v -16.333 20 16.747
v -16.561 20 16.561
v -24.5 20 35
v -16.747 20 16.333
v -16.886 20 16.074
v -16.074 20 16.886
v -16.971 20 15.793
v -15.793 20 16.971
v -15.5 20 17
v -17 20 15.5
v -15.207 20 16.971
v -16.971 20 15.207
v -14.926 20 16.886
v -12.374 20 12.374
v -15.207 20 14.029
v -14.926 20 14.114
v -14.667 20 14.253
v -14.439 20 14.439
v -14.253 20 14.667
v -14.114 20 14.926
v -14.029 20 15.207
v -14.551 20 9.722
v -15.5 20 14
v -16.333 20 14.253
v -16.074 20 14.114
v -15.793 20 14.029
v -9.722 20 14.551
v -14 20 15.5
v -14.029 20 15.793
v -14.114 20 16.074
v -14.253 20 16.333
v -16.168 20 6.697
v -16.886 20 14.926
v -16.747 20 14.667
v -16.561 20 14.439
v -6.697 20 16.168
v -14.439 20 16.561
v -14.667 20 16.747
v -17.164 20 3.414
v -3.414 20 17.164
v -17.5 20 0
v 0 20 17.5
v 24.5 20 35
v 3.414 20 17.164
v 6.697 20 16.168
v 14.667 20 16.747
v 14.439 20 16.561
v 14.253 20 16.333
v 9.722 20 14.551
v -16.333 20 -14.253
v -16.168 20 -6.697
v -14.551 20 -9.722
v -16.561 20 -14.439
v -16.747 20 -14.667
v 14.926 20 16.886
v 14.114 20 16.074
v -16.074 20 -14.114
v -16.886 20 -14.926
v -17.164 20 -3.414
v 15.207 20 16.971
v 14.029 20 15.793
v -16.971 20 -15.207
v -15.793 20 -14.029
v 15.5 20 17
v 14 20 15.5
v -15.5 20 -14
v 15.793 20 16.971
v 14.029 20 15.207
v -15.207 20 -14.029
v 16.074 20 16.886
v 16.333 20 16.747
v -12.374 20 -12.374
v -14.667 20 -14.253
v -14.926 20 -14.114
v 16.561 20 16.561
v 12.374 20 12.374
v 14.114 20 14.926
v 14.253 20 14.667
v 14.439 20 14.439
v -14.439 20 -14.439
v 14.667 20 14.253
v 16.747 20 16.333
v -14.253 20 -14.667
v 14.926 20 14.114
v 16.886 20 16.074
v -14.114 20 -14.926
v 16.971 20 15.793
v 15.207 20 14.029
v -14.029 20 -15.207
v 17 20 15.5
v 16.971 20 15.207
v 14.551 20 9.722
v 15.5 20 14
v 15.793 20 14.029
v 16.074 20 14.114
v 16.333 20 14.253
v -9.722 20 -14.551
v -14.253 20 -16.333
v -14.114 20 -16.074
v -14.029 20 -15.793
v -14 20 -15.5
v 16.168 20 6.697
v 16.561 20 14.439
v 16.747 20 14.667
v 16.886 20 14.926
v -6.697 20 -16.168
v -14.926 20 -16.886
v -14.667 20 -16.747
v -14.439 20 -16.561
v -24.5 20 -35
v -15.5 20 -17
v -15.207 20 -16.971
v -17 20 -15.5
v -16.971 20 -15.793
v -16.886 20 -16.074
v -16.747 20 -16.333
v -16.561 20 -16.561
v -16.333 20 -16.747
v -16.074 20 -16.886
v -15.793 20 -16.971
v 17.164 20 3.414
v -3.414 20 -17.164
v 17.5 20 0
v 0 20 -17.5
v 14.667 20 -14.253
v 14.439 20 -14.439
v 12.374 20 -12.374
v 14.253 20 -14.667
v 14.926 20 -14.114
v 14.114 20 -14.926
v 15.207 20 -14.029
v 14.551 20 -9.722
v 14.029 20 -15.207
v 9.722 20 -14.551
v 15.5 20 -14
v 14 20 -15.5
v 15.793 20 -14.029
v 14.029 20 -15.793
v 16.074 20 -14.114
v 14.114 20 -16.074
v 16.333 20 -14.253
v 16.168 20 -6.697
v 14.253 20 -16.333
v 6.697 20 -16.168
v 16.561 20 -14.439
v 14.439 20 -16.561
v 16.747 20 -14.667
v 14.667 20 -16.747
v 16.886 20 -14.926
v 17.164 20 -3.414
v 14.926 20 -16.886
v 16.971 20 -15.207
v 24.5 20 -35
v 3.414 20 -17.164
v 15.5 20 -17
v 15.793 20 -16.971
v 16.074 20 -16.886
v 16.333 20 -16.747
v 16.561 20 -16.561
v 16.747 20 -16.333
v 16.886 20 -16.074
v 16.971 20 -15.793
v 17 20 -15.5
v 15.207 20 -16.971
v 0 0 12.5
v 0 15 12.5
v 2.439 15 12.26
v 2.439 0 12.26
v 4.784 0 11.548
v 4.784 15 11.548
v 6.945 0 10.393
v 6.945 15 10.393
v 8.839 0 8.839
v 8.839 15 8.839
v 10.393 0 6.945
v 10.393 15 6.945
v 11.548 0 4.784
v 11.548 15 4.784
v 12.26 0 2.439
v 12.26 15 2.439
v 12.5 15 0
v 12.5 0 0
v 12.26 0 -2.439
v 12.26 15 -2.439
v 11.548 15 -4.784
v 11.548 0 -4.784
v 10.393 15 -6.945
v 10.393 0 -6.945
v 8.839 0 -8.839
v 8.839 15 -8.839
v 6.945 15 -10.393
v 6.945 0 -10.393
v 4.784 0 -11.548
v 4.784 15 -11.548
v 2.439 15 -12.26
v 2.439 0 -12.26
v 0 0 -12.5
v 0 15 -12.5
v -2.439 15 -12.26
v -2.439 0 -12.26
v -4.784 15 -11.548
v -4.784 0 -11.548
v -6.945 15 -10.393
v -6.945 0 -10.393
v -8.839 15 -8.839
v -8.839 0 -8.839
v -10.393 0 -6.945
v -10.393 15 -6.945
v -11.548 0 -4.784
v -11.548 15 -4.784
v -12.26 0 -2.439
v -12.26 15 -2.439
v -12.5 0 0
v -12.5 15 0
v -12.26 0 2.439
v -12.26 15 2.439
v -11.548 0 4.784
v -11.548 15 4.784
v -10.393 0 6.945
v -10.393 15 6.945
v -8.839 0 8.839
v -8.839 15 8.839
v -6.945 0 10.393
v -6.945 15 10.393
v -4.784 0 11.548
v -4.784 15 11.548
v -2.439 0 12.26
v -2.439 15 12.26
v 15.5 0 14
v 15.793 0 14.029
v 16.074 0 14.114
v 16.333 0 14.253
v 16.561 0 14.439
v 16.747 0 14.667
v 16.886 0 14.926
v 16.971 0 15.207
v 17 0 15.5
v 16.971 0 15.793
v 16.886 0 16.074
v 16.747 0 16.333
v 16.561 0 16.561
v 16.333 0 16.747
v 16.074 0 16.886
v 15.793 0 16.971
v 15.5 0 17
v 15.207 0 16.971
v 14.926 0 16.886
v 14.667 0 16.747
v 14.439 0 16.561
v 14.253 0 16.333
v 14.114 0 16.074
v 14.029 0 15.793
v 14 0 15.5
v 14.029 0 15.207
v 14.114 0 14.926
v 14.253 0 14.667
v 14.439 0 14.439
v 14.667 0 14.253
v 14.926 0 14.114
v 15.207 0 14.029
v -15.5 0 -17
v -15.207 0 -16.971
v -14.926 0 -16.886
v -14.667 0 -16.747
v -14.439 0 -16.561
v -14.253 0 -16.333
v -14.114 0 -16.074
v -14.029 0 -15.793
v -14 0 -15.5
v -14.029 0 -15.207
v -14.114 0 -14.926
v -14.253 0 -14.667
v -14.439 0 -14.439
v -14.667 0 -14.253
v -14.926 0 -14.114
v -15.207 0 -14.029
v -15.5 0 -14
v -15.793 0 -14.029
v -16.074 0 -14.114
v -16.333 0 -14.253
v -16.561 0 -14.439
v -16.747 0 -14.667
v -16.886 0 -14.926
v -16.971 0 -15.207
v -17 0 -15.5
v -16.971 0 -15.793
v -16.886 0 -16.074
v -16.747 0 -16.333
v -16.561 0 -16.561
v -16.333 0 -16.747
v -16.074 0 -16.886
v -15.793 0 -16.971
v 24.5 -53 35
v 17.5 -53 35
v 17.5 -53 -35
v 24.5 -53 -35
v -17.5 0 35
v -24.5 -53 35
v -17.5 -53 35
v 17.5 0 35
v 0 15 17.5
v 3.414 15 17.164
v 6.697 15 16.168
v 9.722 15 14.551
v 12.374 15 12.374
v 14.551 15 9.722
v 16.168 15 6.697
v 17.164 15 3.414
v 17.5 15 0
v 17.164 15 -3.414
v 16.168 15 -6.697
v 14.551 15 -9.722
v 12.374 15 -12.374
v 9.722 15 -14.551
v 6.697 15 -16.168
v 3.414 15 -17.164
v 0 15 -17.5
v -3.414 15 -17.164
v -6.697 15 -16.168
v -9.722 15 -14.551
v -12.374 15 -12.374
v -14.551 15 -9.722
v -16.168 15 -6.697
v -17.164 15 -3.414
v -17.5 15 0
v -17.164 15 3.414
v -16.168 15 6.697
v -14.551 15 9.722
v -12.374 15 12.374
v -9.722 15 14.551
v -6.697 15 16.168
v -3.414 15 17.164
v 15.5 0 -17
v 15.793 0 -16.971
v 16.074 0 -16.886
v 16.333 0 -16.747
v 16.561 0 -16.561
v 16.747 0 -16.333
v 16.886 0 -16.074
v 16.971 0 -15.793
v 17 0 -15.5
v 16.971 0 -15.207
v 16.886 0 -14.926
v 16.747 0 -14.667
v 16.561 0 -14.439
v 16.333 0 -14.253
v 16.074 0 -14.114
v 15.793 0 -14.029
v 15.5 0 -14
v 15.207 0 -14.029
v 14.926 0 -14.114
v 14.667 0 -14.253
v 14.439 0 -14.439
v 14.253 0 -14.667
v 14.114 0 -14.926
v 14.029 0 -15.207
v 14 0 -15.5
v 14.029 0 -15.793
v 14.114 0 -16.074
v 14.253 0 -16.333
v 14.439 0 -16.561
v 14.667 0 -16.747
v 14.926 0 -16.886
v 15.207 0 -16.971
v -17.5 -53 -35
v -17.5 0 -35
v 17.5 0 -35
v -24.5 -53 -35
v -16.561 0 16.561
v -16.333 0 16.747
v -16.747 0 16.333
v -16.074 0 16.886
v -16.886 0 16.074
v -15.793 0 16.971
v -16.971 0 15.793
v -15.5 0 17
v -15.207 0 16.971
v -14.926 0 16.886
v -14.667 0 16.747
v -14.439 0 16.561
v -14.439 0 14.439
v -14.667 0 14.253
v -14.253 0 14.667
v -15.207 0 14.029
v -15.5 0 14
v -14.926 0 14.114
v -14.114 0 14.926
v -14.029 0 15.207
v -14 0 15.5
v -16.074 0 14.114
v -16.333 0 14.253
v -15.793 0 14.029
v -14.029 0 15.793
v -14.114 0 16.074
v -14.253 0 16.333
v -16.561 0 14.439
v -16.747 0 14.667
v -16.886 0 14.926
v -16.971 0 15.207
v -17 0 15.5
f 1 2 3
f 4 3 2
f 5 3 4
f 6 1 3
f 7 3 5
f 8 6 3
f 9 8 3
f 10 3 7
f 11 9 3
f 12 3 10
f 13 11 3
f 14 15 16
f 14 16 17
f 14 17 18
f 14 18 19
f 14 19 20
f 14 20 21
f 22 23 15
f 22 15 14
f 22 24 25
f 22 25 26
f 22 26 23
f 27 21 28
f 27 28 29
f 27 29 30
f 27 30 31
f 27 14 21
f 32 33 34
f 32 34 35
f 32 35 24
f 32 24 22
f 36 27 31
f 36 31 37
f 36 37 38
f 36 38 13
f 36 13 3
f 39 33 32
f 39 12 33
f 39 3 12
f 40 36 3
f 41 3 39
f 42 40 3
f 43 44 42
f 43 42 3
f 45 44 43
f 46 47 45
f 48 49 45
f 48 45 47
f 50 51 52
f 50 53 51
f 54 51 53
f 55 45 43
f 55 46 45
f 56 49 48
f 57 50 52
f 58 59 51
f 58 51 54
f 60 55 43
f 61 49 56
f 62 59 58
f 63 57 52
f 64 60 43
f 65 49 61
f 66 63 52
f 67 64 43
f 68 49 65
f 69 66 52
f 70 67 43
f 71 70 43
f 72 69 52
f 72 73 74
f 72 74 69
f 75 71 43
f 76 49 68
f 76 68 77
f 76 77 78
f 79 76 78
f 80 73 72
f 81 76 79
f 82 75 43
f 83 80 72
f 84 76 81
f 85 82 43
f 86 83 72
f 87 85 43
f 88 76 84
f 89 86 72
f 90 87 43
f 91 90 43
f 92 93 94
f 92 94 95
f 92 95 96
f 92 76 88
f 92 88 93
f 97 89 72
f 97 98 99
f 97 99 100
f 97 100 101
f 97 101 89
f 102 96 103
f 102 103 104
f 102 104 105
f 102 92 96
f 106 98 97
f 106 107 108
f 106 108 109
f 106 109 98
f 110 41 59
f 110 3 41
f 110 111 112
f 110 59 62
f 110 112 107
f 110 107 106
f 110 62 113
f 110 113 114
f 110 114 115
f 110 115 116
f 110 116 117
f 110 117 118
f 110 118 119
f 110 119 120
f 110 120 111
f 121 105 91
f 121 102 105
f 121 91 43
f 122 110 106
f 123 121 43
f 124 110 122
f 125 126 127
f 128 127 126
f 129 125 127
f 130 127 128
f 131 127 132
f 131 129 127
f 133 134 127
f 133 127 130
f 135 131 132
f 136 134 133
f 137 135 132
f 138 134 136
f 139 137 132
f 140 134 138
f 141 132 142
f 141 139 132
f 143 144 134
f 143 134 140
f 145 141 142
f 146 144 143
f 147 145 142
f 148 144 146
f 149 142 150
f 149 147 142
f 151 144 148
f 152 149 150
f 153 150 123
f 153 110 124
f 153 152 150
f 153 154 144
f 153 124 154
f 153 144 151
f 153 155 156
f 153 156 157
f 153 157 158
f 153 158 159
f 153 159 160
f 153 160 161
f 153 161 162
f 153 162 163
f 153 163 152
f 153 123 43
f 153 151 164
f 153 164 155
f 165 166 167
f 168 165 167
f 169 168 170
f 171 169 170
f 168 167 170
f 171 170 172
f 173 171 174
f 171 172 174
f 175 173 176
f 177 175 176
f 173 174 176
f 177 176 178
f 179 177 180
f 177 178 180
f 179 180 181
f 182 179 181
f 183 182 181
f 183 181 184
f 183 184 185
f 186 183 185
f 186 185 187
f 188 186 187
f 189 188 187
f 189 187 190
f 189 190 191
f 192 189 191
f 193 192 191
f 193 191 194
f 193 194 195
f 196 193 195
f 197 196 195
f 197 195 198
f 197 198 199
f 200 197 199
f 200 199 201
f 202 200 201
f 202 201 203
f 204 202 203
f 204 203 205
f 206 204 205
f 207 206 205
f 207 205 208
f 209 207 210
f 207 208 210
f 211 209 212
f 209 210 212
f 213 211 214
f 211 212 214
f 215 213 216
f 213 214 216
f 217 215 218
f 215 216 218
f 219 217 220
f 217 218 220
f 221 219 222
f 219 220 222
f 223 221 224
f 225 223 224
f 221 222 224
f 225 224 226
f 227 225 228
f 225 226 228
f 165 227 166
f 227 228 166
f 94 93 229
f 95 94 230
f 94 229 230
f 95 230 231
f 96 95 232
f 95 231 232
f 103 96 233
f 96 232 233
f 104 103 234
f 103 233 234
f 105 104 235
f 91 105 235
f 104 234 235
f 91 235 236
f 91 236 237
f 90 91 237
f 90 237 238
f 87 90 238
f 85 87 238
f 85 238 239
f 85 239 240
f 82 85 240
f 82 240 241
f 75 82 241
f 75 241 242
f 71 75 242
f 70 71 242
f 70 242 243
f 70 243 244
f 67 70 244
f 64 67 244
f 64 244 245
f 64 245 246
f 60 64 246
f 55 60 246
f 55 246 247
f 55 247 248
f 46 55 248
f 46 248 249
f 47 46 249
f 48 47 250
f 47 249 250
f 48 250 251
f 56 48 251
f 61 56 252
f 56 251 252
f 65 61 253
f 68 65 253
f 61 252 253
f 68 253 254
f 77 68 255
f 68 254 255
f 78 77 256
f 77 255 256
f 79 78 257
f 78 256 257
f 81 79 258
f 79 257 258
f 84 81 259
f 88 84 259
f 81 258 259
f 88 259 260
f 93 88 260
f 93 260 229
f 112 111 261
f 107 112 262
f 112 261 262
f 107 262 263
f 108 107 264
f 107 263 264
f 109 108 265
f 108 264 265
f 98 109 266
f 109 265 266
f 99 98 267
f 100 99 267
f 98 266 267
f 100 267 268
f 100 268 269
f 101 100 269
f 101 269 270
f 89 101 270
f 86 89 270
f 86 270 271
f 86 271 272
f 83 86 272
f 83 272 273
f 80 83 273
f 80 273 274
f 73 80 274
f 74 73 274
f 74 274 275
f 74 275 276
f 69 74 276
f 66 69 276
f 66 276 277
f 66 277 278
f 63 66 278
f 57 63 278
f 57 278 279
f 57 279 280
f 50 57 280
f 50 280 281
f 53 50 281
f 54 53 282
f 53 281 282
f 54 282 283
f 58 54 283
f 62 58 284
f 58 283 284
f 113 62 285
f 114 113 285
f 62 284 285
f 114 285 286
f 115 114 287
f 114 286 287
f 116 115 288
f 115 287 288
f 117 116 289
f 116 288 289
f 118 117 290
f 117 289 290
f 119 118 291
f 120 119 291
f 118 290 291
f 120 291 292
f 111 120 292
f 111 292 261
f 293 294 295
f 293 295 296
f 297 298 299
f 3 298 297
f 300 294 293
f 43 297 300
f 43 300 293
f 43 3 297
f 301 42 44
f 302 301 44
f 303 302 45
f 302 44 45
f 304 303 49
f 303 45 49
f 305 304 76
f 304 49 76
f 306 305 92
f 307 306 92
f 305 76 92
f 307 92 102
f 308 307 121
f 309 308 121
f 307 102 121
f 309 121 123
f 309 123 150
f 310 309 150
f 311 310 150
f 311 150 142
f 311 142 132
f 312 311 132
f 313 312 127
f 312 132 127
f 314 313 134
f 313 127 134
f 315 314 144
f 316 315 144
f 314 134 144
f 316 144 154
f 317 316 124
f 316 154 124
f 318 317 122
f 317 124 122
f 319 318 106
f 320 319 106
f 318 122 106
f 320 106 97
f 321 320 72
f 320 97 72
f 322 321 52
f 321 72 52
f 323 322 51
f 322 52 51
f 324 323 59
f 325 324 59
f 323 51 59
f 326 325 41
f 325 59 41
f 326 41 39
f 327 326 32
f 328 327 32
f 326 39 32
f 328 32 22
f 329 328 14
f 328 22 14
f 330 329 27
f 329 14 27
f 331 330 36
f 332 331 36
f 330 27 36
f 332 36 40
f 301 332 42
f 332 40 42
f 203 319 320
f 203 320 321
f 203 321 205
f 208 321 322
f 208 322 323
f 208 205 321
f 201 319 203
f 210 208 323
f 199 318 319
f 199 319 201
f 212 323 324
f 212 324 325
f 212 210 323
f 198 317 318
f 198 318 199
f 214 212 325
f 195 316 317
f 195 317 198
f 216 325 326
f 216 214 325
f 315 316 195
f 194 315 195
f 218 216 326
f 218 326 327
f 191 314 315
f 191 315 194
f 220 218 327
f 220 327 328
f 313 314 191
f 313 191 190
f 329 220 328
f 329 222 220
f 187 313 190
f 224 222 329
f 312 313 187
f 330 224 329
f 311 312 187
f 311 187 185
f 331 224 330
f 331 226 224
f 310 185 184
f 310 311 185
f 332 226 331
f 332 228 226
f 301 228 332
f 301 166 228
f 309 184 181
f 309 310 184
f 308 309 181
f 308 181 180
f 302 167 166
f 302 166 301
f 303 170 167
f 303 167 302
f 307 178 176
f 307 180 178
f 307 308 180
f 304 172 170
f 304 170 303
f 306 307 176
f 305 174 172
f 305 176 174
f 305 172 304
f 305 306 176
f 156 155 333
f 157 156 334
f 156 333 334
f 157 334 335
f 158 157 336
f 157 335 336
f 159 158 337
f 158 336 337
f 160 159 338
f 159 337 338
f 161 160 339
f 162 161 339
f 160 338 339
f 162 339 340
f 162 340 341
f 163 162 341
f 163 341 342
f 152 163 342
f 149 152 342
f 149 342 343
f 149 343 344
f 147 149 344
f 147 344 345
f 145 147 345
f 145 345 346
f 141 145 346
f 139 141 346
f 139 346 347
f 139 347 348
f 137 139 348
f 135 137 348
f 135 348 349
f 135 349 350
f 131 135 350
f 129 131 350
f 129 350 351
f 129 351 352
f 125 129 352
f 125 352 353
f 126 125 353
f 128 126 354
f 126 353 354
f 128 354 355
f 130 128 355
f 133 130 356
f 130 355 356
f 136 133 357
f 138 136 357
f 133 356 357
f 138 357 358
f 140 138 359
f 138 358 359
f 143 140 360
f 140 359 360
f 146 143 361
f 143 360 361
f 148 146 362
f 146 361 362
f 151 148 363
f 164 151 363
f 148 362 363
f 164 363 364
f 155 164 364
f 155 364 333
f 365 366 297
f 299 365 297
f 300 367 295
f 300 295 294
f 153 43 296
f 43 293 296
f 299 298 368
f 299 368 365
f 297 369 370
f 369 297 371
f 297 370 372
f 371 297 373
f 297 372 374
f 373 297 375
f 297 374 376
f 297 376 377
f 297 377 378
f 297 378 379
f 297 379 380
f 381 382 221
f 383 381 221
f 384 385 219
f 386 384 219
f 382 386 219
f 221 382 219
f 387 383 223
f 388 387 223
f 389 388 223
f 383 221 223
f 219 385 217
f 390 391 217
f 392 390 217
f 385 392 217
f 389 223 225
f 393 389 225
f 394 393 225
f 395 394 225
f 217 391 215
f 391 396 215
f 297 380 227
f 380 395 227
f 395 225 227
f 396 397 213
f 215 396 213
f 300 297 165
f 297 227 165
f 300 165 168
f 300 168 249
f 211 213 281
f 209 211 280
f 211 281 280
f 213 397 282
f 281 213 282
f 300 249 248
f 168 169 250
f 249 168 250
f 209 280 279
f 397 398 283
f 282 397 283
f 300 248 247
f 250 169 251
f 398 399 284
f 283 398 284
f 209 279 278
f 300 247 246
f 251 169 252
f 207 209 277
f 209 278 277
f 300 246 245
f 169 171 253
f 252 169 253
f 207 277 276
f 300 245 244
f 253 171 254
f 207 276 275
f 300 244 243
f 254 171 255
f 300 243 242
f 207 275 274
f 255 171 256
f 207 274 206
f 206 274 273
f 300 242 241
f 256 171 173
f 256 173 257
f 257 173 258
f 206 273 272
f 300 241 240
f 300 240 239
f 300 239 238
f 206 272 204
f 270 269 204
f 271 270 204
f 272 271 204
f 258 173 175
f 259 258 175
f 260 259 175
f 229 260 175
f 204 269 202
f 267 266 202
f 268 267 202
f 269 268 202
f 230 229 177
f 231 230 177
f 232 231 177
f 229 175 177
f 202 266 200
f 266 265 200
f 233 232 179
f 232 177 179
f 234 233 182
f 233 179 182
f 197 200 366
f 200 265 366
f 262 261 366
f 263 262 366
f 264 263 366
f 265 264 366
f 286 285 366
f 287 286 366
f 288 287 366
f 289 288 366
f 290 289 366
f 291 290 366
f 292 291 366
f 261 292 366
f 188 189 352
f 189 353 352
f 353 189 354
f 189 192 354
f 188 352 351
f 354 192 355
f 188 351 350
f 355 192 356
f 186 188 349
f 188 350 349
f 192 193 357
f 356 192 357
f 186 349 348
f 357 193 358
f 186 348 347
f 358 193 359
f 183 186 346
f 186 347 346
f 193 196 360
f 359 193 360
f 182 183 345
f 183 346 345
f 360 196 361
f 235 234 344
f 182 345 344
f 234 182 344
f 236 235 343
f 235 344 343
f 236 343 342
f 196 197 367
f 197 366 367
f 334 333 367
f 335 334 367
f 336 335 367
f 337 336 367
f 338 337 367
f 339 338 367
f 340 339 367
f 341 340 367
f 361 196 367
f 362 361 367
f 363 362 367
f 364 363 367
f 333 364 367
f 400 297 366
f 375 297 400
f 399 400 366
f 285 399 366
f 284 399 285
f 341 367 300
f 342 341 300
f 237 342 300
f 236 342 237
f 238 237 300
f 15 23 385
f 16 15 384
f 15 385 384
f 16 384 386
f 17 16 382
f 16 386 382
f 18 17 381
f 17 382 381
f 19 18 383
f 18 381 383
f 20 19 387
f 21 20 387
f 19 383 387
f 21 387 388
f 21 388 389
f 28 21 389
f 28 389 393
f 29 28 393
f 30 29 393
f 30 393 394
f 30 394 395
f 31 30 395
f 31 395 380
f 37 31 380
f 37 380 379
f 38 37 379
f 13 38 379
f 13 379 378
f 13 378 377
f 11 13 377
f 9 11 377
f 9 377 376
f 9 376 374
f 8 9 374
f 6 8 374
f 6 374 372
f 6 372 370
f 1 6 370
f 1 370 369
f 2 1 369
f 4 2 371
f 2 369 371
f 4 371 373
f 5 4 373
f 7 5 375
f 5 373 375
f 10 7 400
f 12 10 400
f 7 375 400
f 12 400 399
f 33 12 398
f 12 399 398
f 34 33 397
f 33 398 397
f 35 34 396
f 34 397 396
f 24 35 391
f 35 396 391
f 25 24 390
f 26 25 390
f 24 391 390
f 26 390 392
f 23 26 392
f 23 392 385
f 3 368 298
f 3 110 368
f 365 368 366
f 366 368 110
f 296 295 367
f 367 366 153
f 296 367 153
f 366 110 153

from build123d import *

# Parameters (mm, degrees)
SKETCH1_W           = 49
SKETCH1_H           = 70
BOSS_EXTRUDE1_DEPTH = 20
SKETCH3_R           = 12.5
CUT_EXTRUDE1_DEPTH  = 70
SKETCH4_R           = 1.5
CUT_EXTRUDE2_DEPTH  = 48.172555581
SKETCH5_R           = 17.5
SKETCH5_R_2         = 12.5
CUT_EXTRUDE3_DEPTH  = 5
SKETCH6_W           = 7
SKETCH6_H           = 70
BOSS_EXTRUDE3_DEPTH = 53


with BuildPart() as part:
    # Sketch1 → Boss-Extrude1 (new body)
    with BuildSketch(Plane(origin=(0, 0, 0), x_dir=(1, 0, 0), z_dir=(0, 1, 0))):
        Rectangle(SKETCH1_W, SKETCH1_H)
    extrude(amount=BOSS_EXTRUDE1_DEPTH)

    # Sketch3 → Cut-Extrude1 (cut)
    with BuildSketch(Plane(origin=(0, 20, 0), x_dir=(1, 0, 0), z_dir=(0, 1, 0))):
        with Locations(Location((0, 0, 0), (0, 0, 270))):
            Circle(SKETCH3_R)
    extrude(amount=-CUT_EXTRUDE1_DEPTH, mode=Mode.SUBTRACT)

    # Sketch4 → Cut-Extrude2 (cut, through all)
    with BuildSketch(Plane.XZ):
        with Locations(Location((-15.5, 15.5, 0), (0, 0, 270))):
            Circle(SKETCH4_R)
        with Locations(Location((15.5, 15.5, 0), (0, 0, 270))):
            Circle(SKETCH4_R)
        with Locations(Location((15.5, -15.5, 0), (0, 0, 270))):
            Circle(SKETCH4_R)
        with Locations(Location((-15.5, -15.5, 0), (0, 0, 270))):
            Circle(SKETCH4_R)
    extrude(amount=-CUT_EXTRUDE2_DEPTH, mode=Mode.SUBTRACT)

    # Sketch5 → Cut-Extrude3 (cut)
    with BuildSketch(Plane(origin=(0, 20, 0), x_dir=(1, 0, 0), z_dir=(0, 1, 0))):
        with Locations(Location((0, 0, 0), (0, 0, 270))):
            Circle(SKETCH5_R)
        with Locations(Location((0, 0, 0), (0, 0, 270))):
            Circle(SKETCH5_R_2, mode=Mode.SUBTRACT)
    extrude(amount=-CUT_EXTRUDE3_DEPTH, mode=Mode.SUBTRACT)

    # Sketch6 → Boss-Extrude3 (add)
    with BuildSketch(Plane.XZ):
        with Locations((-21, 0)):
            Rectangle(SKETCH6_W, SKETCH6_H)
        with Locations((21, 0)):
            Rectangle(SKETCH6_W, SKETCH6_H)
    extrude(amount=BOSS_EXTRUDE3_DEPTH)


solid = part.part
